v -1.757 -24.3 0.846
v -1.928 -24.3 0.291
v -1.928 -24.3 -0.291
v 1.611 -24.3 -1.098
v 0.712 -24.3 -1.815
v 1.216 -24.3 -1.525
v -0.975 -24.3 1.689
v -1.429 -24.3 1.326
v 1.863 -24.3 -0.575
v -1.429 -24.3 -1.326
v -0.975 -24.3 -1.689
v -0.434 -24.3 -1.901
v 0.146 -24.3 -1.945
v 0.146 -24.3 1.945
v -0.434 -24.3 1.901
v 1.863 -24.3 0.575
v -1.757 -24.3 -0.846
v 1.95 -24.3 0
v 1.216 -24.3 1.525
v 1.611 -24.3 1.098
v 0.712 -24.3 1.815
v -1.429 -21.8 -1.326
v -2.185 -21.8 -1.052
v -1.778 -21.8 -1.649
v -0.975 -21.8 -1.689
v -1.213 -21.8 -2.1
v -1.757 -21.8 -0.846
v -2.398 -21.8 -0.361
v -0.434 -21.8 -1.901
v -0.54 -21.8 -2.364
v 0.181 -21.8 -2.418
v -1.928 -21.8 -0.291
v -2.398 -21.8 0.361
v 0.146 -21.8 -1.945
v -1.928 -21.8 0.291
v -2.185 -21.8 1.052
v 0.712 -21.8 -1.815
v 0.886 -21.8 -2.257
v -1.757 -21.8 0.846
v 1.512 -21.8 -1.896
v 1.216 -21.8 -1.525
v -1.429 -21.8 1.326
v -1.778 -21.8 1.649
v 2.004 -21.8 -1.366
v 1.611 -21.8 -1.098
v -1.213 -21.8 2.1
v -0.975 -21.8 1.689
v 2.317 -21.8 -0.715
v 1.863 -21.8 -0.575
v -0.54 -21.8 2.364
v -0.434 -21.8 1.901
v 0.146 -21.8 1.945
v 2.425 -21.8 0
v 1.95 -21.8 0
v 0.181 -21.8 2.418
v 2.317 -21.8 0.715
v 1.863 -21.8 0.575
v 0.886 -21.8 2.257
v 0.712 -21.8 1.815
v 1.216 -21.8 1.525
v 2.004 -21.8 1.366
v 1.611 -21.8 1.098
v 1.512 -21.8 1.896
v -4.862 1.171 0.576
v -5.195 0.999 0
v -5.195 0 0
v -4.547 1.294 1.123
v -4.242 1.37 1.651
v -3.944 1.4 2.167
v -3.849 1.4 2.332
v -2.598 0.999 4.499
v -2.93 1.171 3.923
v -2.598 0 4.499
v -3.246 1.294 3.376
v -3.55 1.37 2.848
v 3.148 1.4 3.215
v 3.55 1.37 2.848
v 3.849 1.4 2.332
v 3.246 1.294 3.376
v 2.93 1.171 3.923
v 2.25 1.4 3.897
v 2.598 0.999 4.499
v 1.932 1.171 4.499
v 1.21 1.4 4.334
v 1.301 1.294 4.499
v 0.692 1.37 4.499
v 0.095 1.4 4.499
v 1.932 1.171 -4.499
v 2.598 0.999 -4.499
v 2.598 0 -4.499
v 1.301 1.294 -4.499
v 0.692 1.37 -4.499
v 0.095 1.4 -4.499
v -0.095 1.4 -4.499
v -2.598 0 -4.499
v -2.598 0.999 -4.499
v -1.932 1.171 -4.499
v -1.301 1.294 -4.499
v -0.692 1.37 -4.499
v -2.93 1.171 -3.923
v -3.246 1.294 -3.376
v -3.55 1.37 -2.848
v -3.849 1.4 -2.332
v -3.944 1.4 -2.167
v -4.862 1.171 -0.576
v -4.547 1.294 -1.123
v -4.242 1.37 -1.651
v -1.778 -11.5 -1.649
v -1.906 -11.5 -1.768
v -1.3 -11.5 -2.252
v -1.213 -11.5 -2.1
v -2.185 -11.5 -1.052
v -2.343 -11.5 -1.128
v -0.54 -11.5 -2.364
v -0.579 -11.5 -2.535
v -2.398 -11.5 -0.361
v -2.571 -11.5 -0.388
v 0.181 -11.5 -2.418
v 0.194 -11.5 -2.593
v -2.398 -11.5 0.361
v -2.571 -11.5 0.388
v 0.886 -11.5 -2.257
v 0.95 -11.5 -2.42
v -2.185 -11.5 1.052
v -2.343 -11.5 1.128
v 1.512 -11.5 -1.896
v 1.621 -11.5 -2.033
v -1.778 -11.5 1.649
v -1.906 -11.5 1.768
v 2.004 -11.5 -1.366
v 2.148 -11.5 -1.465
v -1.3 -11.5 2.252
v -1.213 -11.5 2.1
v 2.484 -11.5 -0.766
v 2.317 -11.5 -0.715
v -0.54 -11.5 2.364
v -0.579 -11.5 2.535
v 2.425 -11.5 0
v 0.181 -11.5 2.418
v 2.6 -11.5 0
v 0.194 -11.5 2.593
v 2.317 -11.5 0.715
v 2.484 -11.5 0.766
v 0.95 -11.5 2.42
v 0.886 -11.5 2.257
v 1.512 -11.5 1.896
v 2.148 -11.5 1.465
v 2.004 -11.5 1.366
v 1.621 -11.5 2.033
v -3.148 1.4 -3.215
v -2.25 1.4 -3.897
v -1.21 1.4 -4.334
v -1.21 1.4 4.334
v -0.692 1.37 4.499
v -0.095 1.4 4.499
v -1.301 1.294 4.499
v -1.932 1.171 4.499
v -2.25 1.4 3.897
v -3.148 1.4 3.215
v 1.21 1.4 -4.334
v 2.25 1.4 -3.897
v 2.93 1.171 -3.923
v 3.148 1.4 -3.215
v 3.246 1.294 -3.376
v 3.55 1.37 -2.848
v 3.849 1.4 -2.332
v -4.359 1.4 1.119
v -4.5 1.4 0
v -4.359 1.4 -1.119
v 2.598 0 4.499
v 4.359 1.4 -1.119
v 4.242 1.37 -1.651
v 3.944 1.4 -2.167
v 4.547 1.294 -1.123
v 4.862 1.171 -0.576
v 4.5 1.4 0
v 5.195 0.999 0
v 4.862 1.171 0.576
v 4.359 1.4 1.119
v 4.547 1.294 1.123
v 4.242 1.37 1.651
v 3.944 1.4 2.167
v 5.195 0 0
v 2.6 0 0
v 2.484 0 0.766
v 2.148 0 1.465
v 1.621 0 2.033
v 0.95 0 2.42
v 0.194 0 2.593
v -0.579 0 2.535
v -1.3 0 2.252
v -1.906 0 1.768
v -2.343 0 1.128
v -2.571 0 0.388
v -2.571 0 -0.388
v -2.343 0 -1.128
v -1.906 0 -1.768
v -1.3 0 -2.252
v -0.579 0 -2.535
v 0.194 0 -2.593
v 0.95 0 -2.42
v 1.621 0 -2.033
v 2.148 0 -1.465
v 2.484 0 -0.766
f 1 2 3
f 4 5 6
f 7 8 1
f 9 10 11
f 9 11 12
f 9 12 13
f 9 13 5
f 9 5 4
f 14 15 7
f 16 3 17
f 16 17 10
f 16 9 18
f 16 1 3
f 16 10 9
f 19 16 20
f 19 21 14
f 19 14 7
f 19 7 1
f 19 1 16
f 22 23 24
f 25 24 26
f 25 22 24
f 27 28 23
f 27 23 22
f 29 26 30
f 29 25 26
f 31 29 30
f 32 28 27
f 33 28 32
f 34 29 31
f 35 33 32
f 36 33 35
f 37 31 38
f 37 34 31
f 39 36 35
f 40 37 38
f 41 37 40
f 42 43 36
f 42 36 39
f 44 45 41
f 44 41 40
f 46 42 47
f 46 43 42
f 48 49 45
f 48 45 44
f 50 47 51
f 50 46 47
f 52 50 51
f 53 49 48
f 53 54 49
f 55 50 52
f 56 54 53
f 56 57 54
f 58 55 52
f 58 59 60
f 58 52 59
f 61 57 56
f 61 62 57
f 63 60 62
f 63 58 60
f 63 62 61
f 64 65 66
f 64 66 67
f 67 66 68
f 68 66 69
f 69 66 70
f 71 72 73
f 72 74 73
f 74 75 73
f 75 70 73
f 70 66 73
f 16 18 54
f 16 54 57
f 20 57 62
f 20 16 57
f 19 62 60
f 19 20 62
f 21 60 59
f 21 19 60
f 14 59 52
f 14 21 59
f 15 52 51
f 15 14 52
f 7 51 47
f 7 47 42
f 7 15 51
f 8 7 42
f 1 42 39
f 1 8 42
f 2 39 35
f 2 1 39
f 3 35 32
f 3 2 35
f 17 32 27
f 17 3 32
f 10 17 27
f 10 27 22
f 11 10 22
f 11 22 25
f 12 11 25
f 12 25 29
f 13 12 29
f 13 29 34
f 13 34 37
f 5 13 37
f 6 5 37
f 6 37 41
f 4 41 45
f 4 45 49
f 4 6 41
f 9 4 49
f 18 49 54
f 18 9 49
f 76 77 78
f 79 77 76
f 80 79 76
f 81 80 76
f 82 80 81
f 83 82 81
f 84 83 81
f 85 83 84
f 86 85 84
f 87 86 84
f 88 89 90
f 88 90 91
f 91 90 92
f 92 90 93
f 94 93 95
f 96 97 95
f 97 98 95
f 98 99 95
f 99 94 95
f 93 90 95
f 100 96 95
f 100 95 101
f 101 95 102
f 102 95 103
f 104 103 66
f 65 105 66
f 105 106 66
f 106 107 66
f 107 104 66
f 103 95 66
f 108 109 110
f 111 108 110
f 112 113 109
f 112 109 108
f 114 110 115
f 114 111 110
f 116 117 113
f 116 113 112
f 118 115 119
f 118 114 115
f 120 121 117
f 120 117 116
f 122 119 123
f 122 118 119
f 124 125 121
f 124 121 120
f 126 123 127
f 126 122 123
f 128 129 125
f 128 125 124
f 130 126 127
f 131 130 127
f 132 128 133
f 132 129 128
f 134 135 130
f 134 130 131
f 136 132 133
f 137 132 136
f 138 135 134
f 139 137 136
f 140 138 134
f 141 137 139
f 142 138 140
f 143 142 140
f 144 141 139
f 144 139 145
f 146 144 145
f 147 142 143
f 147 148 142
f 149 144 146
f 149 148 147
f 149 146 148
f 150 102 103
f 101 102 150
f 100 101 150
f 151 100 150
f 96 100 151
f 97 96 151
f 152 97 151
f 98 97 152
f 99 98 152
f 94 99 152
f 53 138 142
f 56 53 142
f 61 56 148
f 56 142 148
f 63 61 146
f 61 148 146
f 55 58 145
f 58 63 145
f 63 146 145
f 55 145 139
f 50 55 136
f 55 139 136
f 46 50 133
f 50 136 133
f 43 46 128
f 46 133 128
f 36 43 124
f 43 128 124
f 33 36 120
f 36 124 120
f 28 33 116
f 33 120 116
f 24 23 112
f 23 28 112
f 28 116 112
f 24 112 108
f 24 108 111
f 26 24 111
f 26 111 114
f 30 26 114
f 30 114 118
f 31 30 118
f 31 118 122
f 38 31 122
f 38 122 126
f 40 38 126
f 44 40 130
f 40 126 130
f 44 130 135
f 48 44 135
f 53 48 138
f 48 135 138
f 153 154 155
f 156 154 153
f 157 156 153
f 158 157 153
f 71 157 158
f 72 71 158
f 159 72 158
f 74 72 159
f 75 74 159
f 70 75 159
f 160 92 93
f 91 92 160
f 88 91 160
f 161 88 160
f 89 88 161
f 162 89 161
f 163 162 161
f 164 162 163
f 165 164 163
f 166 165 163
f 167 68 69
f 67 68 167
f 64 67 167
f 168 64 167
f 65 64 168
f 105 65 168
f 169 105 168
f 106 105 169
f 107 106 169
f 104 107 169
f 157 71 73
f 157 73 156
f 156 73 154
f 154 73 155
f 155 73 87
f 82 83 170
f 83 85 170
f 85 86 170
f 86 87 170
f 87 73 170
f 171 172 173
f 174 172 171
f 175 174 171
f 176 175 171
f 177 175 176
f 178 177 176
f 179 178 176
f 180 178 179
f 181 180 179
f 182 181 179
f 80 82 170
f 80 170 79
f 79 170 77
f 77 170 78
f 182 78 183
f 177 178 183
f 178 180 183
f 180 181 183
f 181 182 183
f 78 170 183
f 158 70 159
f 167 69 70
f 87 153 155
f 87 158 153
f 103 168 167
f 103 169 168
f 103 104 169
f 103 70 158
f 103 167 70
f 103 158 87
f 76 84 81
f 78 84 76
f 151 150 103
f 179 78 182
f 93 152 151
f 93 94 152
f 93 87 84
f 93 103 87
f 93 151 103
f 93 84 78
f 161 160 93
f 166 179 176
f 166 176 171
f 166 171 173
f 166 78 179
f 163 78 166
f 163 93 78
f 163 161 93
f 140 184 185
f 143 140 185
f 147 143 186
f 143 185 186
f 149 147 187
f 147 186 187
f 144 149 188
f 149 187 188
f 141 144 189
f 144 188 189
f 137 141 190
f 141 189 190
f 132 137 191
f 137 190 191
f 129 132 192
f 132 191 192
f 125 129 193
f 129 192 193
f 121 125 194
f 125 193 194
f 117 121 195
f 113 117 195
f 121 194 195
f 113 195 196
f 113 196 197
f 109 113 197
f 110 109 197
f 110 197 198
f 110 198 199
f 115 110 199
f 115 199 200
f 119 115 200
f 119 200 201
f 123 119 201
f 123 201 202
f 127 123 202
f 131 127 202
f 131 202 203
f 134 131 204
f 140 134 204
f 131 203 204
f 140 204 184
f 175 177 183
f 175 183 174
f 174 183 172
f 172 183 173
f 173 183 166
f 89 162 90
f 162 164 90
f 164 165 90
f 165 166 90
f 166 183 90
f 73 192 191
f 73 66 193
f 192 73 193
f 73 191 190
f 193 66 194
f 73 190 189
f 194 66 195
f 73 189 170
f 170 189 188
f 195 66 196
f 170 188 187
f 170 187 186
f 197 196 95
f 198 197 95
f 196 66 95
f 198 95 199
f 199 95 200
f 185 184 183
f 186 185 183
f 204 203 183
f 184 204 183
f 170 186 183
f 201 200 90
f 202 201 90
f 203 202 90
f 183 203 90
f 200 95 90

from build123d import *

# Parameters (mm, degrees)
BOSS_EXTRUDE1_DEPTH = 1.4
SKETCH2_OUTSIDE_W   = 18.618
SKETCH2_OUTSIDE_H   = 17.226
SKETCH2_OUTSIDE_R   = 4.5
CUT_EXTRUDE1_DEPTH  = 1
CUT_EXTRUDE1_TAPER  = 60
SKETCH3_R           = 2.425
BOSS_EXTRUDE2_DEPTH = 24.3
SKETCH4_OUTSIDE_W   = 18.218
SKETCH4_OUTSIDE_H   = 16.826
SKETCH4_OUTSIDE_R   = 1.95
CUT_EXTRUDE2_DEPTH  = 2.5
SKETCH5_R           = 2.6
BOSS_EXTRUDE3_DEPTH = 11.5


with BuildPart() as part:
    # Sketch1 → Boss-Extrude1 (new body)
    with BuildSketch(Plane(origin=(0, 0, 0), x_dir=(1, 0, 0), z_dir=(0, 1, 0))):
        Polygon((5.195, 0), (2.5975, 4.499001973), (-2.5975, 4.499001973), (-5.195, 0), (-2.5975, -4.499001973), (2.5975, -4.499001973), align=None)
    extrude(amount=BOSS_EXTRUDE1_DEPTH)

    # Sketch2 outside → Cut-Extrude1 (cut)
    with BuildSketch(Plane(origin=(0, 1.4, 0), x_dir=(1, 0, 0), z_dir=(0, 1, 0))):
        Rectangle(SKETCH2_OUTSIDE_W, SKETCH2_OUTSIDE_H)
        Circle(SKETCH2_OUTSIDE_R, mode=Mode.SUBTRACT)
    extrude(amount=-CUT_EXTRUDE1_DEPTH, taper=CUT_EXTRUDE1_TAPER, mode=Mode.SUBTRACT)

    # Sketch3 → Boss-Extrude2 (add)
    with BuildSketch(Plane.XZ):
        Circle(SKETCH3_R)
    extrude(amount=BOSS_EXTRUDE2_DEPTH)

    # Sketch4 outside → Cut-Extrude2 (cut)
    with BuildSketch(Plane.XZ.offset(24.3)):
        Rectangle(SKETCH4_OUTSIDE_W, SKETCH4_OUTSIDE_H)
        Circle(SKETCH4_OUTSIDE_R, mode=Mode.SUBTRACT)
    extrude(amount=-CUT_EXTRUDE2_DEPTH, mode=Mode.SUBTRACT)

    # Sketch5 → Boss-Extrude3 (add)
    with BuildSketch(Plane.XZ):
        Circle(SKETCH5_R)
    extrude(amount=BOSS_EXTRUDE3_DEPTH)


solid = part.part
